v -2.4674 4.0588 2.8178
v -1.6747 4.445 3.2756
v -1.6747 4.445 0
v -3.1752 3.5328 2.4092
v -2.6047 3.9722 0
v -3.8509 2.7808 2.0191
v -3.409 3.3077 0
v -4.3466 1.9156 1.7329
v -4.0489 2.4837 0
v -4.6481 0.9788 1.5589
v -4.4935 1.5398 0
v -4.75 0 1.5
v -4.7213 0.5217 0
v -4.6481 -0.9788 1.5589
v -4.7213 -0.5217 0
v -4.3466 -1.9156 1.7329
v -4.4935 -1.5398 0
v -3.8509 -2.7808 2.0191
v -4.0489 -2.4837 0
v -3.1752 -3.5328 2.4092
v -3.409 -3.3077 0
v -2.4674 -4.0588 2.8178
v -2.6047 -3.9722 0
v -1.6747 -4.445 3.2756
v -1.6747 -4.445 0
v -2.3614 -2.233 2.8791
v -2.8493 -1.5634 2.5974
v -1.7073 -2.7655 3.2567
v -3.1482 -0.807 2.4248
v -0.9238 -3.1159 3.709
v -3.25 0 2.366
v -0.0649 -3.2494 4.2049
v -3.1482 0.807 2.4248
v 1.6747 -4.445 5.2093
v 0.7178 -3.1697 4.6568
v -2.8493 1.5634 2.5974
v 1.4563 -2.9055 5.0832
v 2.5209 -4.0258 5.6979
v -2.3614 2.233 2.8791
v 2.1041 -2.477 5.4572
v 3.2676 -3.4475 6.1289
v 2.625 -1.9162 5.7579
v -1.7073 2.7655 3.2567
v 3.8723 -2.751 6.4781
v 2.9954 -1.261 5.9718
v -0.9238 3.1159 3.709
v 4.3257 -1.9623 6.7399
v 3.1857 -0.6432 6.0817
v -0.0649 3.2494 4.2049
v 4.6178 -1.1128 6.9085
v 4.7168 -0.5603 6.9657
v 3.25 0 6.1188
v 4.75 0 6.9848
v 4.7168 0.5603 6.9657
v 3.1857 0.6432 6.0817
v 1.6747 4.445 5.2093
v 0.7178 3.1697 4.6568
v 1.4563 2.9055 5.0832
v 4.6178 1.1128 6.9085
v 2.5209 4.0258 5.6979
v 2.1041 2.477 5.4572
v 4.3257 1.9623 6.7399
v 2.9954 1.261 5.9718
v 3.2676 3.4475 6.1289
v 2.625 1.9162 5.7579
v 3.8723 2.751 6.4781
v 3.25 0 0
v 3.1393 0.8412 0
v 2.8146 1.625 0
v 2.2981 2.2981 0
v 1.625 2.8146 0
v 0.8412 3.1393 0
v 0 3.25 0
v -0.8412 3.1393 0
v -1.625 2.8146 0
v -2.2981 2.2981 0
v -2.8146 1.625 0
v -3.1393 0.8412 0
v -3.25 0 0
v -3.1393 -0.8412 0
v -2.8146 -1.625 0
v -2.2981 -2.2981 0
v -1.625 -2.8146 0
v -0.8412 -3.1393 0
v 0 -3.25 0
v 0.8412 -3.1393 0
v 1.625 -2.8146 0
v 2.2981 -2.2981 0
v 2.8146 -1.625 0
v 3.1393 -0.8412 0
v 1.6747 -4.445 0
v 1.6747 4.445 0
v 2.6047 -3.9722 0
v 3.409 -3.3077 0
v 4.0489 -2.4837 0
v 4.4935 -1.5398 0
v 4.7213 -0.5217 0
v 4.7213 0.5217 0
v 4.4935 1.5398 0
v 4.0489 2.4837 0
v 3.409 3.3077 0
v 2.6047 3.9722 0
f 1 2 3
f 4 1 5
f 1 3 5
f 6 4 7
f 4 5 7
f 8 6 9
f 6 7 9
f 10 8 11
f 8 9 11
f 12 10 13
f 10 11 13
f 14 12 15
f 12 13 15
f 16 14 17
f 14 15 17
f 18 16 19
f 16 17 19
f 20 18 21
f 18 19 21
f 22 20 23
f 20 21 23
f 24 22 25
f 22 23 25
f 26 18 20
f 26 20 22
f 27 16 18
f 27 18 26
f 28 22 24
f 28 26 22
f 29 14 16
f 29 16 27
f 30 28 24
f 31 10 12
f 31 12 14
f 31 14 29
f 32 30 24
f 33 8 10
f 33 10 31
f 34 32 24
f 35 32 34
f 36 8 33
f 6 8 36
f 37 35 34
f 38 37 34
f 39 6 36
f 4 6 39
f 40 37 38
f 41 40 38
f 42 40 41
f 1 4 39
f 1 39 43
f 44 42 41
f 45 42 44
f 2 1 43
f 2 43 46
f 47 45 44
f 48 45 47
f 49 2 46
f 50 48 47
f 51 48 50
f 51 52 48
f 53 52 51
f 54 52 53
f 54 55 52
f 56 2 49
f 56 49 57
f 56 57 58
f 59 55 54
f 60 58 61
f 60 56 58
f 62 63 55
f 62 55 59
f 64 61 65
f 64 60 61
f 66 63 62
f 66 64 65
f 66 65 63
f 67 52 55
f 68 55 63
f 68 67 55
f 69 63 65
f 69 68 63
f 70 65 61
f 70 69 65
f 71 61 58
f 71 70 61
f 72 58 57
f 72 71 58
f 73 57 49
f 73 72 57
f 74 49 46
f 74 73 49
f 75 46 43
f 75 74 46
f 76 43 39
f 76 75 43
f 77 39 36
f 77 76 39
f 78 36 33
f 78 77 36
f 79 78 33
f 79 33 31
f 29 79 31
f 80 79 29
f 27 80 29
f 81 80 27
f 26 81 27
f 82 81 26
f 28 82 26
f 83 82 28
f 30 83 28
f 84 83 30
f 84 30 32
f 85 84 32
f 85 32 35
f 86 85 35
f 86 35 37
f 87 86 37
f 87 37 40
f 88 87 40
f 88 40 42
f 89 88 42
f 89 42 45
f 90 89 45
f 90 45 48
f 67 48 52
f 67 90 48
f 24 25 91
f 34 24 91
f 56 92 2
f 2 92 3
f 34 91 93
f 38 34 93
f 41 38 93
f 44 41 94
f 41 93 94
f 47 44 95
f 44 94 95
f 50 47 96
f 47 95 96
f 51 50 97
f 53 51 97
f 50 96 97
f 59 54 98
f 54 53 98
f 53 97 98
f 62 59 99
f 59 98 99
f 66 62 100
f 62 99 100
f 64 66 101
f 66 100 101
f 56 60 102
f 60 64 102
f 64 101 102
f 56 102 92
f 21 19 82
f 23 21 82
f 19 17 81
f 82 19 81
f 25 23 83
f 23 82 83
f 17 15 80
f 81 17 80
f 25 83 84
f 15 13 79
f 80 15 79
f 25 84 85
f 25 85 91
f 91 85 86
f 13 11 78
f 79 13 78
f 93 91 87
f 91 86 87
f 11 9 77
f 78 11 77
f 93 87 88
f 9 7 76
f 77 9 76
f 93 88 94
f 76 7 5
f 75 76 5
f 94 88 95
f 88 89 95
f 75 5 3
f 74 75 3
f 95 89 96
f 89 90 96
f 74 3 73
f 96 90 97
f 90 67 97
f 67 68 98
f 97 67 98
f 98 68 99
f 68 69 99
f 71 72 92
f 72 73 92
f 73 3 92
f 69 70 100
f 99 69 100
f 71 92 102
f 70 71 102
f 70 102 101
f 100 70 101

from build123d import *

# Parameters (mm, degrees)
F0_R          = 4.75
F0_R_2        = 3.25
F1_DEPTH      = 10
F3_DEPTH      = 4.751
F3_DEPTH_BACK = 4.751
F5_DEPTH      = 6.9858275573


with BuildPart() as f1:
    # F0 (on Top) → F1 (new body)
    with BuildSketch(Plane.XY):
        Circle(F0_R)
        Circle(F0_R_2, mode=Mode.SUBTRACT)
    extrude(amount=F1_DEPTH)

    # F2 (on Front) → F3 (cut, two sides)
    with BuildSketch(Plane.XZ) as f3_sk:
        Polygon((4.75, 10), (-4.75, 10), (-4.75, 1.5), (4.75, 6.9848275573), align=None)
    extrude(amount=-F3_DEPTH, mode=Mode.SUBTRACT)
    extrude(f3_sk.sketch, amount=F3_DEPTH_BACK, mode=Mode.SUBTRACT)

    # F4 (on face) → F5 (cut, through all)
    with BuildSketch(Plane(origin=(0, 0, 0), x_dir=(1, 0, 0), z_dir=(0, 0, -1))):
        with BuildLine():
            Line((-1.6746566812, 4.445), (1.6746566812, 4.445))
            ThreePointArc((1.6746566812, 4.445), (0, 4.75), (-1.6746566812, 4.445))
        make_face()
        with BuildLine():
            Line((1.6746566812, -4.445), (-1.6746566812, -4.445))
            ThreePointArc((-1.6746566812, -4.445), (0, -4.75), (1.6746566812, -4.445))
        make_face()
    extrude(amount=-F5_DEPTH, mode=Mode.SUBTRACT)


solid = f1.part
